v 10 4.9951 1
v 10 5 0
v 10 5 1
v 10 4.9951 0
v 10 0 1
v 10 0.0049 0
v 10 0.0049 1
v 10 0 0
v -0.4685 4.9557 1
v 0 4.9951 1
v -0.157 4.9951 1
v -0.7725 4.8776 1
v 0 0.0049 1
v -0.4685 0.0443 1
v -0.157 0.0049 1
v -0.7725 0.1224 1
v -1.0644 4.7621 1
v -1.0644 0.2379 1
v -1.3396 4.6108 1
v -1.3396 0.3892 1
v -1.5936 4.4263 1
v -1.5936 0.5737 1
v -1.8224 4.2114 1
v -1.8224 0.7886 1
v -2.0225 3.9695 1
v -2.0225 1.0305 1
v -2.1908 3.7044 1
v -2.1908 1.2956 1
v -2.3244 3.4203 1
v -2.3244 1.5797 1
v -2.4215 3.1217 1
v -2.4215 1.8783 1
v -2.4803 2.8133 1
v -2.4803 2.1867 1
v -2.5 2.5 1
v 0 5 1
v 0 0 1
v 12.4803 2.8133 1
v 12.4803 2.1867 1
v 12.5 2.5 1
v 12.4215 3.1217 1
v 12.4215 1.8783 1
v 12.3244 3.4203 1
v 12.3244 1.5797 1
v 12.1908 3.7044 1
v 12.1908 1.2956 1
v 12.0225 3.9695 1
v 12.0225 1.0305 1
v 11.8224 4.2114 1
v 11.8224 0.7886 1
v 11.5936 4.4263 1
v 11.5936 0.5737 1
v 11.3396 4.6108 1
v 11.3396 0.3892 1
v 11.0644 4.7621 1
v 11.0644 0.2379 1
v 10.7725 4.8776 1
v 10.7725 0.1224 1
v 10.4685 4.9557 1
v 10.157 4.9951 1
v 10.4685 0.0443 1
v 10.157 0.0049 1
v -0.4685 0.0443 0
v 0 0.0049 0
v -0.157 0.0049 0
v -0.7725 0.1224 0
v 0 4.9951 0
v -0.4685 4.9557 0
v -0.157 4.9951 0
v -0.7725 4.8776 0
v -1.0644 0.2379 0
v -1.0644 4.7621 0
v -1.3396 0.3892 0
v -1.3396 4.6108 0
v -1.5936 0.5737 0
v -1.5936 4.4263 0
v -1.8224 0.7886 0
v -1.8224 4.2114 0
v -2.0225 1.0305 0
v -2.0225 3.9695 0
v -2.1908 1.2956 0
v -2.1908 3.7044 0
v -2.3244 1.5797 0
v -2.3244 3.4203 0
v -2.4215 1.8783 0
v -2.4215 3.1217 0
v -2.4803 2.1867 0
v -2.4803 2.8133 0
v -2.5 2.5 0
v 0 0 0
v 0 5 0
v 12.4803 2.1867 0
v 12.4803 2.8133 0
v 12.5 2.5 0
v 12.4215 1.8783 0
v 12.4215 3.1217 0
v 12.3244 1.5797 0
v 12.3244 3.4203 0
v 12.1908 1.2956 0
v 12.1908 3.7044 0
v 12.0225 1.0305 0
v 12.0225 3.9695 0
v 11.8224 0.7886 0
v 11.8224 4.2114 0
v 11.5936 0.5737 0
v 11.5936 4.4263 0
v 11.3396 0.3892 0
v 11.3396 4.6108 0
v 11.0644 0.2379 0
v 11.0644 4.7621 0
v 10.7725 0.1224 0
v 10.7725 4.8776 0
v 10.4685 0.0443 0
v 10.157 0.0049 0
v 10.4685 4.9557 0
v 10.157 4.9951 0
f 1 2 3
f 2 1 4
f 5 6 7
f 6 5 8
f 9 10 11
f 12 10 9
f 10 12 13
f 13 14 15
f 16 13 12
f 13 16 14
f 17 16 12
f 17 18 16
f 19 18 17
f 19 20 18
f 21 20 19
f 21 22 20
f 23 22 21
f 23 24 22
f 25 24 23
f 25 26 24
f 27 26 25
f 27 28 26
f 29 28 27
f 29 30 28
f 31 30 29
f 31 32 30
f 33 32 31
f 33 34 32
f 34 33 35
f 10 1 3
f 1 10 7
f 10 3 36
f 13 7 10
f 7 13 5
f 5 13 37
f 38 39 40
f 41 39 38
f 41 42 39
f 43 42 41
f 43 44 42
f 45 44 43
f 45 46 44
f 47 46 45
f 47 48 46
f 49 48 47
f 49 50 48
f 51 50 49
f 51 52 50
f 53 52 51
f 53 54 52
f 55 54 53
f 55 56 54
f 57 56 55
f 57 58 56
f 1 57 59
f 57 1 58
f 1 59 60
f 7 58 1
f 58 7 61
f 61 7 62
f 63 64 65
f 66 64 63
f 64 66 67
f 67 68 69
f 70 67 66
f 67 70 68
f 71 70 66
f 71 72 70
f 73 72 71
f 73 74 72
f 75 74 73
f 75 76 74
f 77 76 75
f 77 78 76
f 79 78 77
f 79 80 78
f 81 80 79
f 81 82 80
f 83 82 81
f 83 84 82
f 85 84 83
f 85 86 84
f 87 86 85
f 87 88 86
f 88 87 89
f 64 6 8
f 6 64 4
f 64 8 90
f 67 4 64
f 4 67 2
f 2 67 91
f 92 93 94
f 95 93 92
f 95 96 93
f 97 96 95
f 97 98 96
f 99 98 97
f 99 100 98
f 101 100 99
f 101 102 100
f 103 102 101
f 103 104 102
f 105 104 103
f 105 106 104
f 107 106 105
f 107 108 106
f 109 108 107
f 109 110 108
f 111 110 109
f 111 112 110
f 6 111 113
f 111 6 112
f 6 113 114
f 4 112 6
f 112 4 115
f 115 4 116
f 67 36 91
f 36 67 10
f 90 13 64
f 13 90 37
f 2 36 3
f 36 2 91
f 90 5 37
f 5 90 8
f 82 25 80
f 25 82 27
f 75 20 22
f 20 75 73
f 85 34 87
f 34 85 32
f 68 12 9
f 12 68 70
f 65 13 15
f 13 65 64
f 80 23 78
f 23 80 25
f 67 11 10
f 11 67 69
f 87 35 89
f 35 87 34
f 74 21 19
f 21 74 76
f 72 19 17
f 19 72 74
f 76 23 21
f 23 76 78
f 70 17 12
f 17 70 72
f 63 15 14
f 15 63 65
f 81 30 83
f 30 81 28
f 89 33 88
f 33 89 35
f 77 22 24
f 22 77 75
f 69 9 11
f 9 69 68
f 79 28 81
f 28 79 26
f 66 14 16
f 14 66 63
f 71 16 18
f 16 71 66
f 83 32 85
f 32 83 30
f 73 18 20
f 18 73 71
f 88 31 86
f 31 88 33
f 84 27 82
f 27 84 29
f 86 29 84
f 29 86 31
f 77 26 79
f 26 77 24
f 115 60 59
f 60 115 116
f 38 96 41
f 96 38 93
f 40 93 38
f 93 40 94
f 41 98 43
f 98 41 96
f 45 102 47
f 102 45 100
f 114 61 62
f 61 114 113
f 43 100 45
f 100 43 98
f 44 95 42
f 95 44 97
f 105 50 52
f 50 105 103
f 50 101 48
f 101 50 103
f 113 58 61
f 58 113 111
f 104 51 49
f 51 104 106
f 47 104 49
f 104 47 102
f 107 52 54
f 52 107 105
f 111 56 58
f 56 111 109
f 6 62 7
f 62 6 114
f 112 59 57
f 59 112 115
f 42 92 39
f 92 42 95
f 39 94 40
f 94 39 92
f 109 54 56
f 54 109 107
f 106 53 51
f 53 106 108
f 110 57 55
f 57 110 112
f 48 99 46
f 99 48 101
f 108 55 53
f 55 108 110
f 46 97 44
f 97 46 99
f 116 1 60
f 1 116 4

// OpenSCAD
$fn = 50;

trY=2.5;

//plantilla
cube(size=[10,5,1]);
translate([0,2.5,0]) cylinder(h = 1, r = 2.5); //toe
translate([10,2.5,0]) cylinder(h = 1, r = 2.5); //heel

module back(){
	difference(){
		rotate([0,5,0])
		translate([10,trY,1]) cylinder(h=5.5, r=2.5);

		rotate([0,5,0])
		translate([9,trY,1]) cylinder(h=7, r=2.5);	
	}
}

module flipflop(y){
	difference(){
		translate([0,trY,2.5]) rotate([0,y,0]) cylinder(h=1, r=2.5);
	
		translate([-1,trY,2.5]) rotate([0,y,0]) cylinder(h=3, r= 2);
	}
}

module sandal(){
	back();
	flipflop(85);

	difference(){
		translate([0,trY,0]) rotate([0,-10,0]) cylinder(h=5, r=2.5);
	
		cube(size=[3,6,7]);

		translate([-1.4,trY,2.5]) rotate([0,80,0]) cylinder(h=3, r= 2);
	}
}

module slipper(){
	sandal();
	rotate([0,-3,0]) cube(size=[10.5,0.5,5]);
	translate([0,4.5,0]) rotate([0,-3,0]) cube(size=[10.5,0.5,5]);
	difference(){
		translate([-2.9,trY,4]) rotate([0,80,0]) cylinder(h=8, r=2.5);

		translate([0,trY,3]) rotate([0,80,0]) cylinder(h=6, r=2.5);
	}
		
}

//flipflop(90);
//sandal();
//slipper();
